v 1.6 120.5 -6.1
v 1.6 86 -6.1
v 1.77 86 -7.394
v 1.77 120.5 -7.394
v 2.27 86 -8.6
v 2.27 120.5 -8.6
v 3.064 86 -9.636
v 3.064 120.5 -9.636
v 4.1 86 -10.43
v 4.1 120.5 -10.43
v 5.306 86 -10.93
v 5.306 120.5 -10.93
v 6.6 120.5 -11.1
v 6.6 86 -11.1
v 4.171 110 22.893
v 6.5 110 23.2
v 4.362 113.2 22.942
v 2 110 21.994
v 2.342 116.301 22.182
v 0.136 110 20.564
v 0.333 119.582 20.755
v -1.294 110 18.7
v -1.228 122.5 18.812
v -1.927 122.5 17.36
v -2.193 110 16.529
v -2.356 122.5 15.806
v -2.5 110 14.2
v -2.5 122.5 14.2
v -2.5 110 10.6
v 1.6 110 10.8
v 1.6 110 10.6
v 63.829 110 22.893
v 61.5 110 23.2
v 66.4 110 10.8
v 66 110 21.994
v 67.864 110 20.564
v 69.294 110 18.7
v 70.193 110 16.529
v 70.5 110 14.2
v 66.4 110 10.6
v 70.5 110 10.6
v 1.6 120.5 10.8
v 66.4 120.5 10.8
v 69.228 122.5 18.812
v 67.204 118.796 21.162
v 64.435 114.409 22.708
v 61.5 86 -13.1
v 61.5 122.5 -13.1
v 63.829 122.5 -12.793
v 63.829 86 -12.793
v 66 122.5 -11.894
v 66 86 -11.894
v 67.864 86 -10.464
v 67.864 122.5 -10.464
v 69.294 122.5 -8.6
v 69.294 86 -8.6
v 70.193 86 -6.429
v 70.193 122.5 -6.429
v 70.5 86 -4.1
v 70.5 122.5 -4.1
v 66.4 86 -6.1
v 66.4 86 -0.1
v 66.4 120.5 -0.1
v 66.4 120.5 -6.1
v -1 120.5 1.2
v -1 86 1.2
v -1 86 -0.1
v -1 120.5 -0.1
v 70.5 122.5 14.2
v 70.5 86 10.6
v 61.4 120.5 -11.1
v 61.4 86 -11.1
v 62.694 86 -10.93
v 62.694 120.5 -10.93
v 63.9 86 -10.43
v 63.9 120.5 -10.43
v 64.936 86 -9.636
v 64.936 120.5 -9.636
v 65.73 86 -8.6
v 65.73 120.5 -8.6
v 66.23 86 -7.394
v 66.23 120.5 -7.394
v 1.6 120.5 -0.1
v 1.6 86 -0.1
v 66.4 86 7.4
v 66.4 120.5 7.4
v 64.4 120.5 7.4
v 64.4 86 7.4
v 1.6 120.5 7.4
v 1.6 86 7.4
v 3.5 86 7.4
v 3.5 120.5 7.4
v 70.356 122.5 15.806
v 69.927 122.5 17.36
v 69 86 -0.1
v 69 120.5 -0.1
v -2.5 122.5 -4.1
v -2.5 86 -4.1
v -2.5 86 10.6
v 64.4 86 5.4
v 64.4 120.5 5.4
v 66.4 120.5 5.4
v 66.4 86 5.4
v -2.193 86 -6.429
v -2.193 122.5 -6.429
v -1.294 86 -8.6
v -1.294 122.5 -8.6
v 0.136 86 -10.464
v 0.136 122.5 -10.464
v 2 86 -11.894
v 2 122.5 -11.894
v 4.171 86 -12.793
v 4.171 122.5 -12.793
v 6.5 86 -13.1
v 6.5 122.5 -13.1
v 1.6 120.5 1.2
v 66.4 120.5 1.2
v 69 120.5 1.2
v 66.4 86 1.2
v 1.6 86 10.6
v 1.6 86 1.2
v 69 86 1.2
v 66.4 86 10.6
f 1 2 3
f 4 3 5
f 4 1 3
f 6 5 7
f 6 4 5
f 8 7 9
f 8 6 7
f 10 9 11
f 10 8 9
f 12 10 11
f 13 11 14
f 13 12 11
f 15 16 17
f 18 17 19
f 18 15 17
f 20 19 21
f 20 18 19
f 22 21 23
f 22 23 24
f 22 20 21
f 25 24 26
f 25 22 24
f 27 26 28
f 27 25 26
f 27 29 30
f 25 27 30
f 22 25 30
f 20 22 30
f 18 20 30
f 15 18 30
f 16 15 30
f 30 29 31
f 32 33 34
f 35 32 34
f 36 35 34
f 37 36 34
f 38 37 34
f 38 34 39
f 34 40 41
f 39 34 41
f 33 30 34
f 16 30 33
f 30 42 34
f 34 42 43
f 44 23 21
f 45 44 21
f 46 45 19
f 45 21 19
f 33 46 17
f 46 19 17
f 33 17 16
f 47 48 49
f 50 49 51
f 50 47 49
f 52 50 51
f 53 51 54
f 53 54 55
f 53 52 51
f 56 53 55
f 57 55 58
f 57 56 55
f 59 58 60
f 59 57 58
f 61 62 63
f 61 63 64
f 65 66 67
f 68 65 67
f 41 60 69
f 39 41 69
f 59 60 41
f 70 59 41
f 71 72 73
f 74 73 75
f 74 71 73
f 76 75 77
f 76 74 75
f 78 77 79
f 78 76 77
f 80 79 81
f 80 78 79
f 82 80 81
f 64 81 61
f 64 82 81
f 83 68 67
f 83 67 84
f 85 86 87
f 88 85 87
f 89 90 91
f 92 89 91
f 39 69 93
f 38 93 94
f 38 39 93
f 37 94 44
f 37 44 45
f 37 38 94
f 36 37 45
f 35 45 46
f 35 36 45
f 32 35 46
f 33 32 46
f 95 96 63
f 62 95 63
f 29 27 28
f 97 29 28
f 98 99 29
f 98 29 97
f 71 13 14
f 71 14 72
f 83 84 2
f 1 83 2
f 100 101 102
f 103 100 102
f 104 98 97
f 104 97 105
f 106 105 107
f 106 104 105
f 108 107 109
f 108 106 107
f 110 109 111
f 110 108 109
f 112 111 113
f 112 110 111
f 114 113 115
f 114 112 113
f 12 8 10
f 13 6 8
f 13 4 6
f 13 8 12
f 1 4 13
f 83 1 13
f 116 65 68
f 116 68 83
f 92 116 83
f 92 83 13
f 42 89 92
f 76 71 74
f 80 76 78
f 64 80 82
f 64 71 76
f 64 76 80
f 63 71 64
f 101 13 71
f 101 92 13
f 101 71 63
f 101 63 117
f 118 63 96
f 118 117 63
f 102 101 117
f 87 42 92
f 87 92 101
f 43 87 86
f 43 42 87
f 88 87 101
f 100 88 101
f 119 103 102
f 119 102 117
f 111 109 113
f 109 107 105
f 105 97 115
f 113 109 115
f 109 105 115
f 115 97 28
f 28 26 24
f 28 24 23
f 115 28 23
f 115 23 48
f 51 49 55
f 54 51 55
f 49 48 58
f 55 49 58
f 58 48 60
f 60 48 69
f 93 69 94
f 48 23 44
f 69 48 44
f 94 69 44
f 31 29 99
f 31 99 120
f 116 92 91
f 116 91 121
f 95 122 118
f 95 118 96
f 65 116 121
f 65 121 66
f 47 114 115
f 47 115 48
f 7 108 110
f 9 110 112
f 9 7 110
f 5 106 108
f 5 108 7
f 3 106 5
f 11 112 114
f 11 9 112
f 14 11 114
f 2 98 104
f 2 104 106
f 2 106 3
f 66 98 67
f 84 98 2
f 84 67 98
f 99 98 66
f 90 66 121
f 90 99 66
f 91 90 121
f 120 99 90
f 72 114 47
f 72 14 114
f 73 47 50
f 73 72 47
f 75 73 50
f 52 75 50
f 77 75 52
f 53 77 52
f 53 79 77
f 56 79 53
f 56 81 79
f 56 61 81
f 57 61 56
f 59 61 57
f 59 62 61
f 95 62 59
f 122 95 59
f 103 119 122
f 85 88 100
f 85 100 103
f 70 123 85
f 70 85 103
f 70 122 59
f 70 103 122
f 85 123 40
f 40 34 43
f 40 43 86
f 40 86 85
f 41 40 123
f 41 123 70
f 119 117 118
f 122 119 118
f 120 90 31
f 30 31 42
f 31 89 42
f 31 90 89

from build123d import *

# Parameters (mm, degrees)
EXTRUDE036_DEPTH                     = 100
EXTRUDE035_DEPTH                     = 2
EXTRUDE035_ONTO_SKETCH048_ROLL_ANGLE = 90
BOX016_W                             = 80
BOX016_H                             = 28
BOX016_DEPTH                         = 30
EXTRUDE034_DEPTH                     = 35.5
EXTRUDE034_ONTO_SKETCH047_ROLL_ANGLE = 90


with BuildPart() as round_cut:
    # Sketch049 → Extrude036 (new body)
    with BuildSketch(Plane.YZ.offset(-14)):
        with BuildLine():
            Line((100, 23.2), (100, 26.2))
            Line((100, 26.2), (133, 26.2))
            Line((133, 26.2), (133, -6.8))
            Line((133, -6.8), (130, -6.8))
            Line((130, -6.8), (130, 3.2))
            ThreePointArc((130, 3.2), (124.142136, 17.342136), (110, 23.2))
            Line((100, 23.2), (110, 23.2))
        make_face()
    extrude(amount=EXTRUDE036_DEPTH)


with BuildPart() as extrude035:
    # Sketch048 as drawn → Extrude035 (new)
    with BuildSketch(Plane.XY):
        with BuildLine():
            Line((-2.5, 14.2), (-2.5, -4.1))
            ThreePointArc((-2.5, -4.1), (0.136039, -10.463961), (6.5, -13.1))
            Line((6.5, -13.1), (61.5, -13.1))
            ThreePointArc((61.5, -13.1), (67.863961, -10.463961), (70.5, -4.1))
            Line((70.5, -4.1), (70.5, 14.2))
            ThreePointArc((70.5, 14.2), (67.863961, 20.563961), (61.5, 23.2))
            Line((6.5, 23.2), (61.5, 23.2))
            ThreePointArc((6.5, 23.2), (0.136039, 20.563961), (-2.5, 14.2))
        make_face()
    extrude(amount=-EXTRUDE035_DEPTH)


with BuildPart() as extrude035_1:
    # Extrude035 onto Sketch048 roll: moved
    add(extrude035.part.rotate(Axis((0, 0, 0), (1, 0, 0)), EXTRUDE035_ONTO_SKETCH048_ROLL_ANGLE))


with BuildPart() as extrude035_2:
    # Extrude035 onto Sketch048 placement: moved
    add(extrude035_1.part.moved(Location((0, 120, 0))))


with BuildPart() as extrude035_3:
    # Extrude035 placement: moved
    add(extrude035_2.part.moved(Location((0, 0.5, 0))))


with BuildPart() as cube004:
    # Box016 → Box016 (new body)
    with BuildSketch(Plane(origin=(-5, 82, 10.6), x_dir=(1, 0, 0), z_dir=(0, 0, 1))):
        with Locations((40, 14)):
            Rectangle(BOX016_W, BOX016_H)
    extrude(amount=BOX016_DEPTH)


with BuildPart() as cut012:
    # Sketch047 as drawn → Extrude034 (new)
    with BuildSketch(Plane.XY):
        with BuildLine():
            Line((-2.5, 14.2), (-2.5, -4.1))
            ThreePointArc((-2.5, -4.1), (0.136039, -10.463961), (6.5, -13.1))
            Line((6.5, -13.1), (61.5, -13.1))
            ThreePointArc((61.5, -13.1), (67.863961, -10.463961), (70.5, -4.1))
            Line((70.5, -4.1), (70.5, 14.2))
            ThreePointArc((70.5, 14.2), (67.863961, 20.563961), (61.5, 23.2))
            Line((6.5, 23.2), (61.5, 23.2))
            ThreePointArc((6.5, 23.2), (0.136039, 20.563961), (-2.5, 14.2))
        make_face()
        with BuildLine():
            Line((1.6, 1.2), (-1, 1.2))
            Line((-1, 1.2), (-1, -0.1))
            Line((-1, -0.1), (1.6, -0.1))
            Line((1.6, -0.1), (1.6, -6.1))
            ThreePointArc((1.6, -6.1), (3.064466, -9.635534), (6.6, -11.1))
            Line((6.6, -11.1), (61.4, -11.1))
            ThreePointArc((61.4, -11.1), (64.935534, -9.635534), (66.4, -6.1))
            Line((66.4, -0.1), (66.4, -6.1))
            Line((69, -0.1), (66.4, -0.1))
            Line((69, 1.2), (69, -0.1))
            Line((66.4, 1.2), (69, 1.2))
            Line((66.4, 5.4), (66.4, 1.2))
            Line((64.4, 5.4), (66.4, 5.4))
            Line((64.4, 7.4), (64.4, 5.4))
            Line((66.4, 7.4), (64.4, 7.4))
            Line((66.4, 10.6), (66.4, 7.4))
            Line((66.4, 10.6), (66.4, 10.8))
            Line((66.4, 10.8), (64.5, 10.8))
            Line((64.5, 10.8), (3.5, 10.8))
            Line((1.6, 10.8), (3.5, 10.8))
            Line((1.6, 10.6), (1.6, 10.8))
            Line((1.6, 10.6), (1.6, 7.4))
            Line((1.6, 7.4), (3.5, 7.4))
            Line((3.5, 7.4), (1.6, 1.2))
        make_face(mode=Mode.SUBTRACT)
    extrude(amount=EXTRUDE034_DEPTH)


with BuildPart() as cut012_1:
    # Extrude034 onto Sketch047 roll: moved
    add(cut012.part.rotate(Axis((0, 0, 0), (1, 0, 0)), EXTRUDE034_ONTO_SKETCH047_ROLL_ANGLE))


with BuildPart() as cut012_2:
    # Extrude034 onto Sketch047 placement: moved
    add(cut012_1.part.moved(Location((0, 120, 0))))


with BuildPart() as cut012_3:
    # Extrude034 placement: moved
    add(cut012_2.part.moved(Location((0, 1.5, 0))))

    # Cut011: cut Cube004
    add(cube004.part, mode=Mode.SUBTRACT)

    # Fusion020: union Extrude035
    add(extrude035_3.part)

    # Cut012: cut round_cut
    add(round_cut.part, mode=Mode.SUBTRACT)


solid = cut012_3.part
